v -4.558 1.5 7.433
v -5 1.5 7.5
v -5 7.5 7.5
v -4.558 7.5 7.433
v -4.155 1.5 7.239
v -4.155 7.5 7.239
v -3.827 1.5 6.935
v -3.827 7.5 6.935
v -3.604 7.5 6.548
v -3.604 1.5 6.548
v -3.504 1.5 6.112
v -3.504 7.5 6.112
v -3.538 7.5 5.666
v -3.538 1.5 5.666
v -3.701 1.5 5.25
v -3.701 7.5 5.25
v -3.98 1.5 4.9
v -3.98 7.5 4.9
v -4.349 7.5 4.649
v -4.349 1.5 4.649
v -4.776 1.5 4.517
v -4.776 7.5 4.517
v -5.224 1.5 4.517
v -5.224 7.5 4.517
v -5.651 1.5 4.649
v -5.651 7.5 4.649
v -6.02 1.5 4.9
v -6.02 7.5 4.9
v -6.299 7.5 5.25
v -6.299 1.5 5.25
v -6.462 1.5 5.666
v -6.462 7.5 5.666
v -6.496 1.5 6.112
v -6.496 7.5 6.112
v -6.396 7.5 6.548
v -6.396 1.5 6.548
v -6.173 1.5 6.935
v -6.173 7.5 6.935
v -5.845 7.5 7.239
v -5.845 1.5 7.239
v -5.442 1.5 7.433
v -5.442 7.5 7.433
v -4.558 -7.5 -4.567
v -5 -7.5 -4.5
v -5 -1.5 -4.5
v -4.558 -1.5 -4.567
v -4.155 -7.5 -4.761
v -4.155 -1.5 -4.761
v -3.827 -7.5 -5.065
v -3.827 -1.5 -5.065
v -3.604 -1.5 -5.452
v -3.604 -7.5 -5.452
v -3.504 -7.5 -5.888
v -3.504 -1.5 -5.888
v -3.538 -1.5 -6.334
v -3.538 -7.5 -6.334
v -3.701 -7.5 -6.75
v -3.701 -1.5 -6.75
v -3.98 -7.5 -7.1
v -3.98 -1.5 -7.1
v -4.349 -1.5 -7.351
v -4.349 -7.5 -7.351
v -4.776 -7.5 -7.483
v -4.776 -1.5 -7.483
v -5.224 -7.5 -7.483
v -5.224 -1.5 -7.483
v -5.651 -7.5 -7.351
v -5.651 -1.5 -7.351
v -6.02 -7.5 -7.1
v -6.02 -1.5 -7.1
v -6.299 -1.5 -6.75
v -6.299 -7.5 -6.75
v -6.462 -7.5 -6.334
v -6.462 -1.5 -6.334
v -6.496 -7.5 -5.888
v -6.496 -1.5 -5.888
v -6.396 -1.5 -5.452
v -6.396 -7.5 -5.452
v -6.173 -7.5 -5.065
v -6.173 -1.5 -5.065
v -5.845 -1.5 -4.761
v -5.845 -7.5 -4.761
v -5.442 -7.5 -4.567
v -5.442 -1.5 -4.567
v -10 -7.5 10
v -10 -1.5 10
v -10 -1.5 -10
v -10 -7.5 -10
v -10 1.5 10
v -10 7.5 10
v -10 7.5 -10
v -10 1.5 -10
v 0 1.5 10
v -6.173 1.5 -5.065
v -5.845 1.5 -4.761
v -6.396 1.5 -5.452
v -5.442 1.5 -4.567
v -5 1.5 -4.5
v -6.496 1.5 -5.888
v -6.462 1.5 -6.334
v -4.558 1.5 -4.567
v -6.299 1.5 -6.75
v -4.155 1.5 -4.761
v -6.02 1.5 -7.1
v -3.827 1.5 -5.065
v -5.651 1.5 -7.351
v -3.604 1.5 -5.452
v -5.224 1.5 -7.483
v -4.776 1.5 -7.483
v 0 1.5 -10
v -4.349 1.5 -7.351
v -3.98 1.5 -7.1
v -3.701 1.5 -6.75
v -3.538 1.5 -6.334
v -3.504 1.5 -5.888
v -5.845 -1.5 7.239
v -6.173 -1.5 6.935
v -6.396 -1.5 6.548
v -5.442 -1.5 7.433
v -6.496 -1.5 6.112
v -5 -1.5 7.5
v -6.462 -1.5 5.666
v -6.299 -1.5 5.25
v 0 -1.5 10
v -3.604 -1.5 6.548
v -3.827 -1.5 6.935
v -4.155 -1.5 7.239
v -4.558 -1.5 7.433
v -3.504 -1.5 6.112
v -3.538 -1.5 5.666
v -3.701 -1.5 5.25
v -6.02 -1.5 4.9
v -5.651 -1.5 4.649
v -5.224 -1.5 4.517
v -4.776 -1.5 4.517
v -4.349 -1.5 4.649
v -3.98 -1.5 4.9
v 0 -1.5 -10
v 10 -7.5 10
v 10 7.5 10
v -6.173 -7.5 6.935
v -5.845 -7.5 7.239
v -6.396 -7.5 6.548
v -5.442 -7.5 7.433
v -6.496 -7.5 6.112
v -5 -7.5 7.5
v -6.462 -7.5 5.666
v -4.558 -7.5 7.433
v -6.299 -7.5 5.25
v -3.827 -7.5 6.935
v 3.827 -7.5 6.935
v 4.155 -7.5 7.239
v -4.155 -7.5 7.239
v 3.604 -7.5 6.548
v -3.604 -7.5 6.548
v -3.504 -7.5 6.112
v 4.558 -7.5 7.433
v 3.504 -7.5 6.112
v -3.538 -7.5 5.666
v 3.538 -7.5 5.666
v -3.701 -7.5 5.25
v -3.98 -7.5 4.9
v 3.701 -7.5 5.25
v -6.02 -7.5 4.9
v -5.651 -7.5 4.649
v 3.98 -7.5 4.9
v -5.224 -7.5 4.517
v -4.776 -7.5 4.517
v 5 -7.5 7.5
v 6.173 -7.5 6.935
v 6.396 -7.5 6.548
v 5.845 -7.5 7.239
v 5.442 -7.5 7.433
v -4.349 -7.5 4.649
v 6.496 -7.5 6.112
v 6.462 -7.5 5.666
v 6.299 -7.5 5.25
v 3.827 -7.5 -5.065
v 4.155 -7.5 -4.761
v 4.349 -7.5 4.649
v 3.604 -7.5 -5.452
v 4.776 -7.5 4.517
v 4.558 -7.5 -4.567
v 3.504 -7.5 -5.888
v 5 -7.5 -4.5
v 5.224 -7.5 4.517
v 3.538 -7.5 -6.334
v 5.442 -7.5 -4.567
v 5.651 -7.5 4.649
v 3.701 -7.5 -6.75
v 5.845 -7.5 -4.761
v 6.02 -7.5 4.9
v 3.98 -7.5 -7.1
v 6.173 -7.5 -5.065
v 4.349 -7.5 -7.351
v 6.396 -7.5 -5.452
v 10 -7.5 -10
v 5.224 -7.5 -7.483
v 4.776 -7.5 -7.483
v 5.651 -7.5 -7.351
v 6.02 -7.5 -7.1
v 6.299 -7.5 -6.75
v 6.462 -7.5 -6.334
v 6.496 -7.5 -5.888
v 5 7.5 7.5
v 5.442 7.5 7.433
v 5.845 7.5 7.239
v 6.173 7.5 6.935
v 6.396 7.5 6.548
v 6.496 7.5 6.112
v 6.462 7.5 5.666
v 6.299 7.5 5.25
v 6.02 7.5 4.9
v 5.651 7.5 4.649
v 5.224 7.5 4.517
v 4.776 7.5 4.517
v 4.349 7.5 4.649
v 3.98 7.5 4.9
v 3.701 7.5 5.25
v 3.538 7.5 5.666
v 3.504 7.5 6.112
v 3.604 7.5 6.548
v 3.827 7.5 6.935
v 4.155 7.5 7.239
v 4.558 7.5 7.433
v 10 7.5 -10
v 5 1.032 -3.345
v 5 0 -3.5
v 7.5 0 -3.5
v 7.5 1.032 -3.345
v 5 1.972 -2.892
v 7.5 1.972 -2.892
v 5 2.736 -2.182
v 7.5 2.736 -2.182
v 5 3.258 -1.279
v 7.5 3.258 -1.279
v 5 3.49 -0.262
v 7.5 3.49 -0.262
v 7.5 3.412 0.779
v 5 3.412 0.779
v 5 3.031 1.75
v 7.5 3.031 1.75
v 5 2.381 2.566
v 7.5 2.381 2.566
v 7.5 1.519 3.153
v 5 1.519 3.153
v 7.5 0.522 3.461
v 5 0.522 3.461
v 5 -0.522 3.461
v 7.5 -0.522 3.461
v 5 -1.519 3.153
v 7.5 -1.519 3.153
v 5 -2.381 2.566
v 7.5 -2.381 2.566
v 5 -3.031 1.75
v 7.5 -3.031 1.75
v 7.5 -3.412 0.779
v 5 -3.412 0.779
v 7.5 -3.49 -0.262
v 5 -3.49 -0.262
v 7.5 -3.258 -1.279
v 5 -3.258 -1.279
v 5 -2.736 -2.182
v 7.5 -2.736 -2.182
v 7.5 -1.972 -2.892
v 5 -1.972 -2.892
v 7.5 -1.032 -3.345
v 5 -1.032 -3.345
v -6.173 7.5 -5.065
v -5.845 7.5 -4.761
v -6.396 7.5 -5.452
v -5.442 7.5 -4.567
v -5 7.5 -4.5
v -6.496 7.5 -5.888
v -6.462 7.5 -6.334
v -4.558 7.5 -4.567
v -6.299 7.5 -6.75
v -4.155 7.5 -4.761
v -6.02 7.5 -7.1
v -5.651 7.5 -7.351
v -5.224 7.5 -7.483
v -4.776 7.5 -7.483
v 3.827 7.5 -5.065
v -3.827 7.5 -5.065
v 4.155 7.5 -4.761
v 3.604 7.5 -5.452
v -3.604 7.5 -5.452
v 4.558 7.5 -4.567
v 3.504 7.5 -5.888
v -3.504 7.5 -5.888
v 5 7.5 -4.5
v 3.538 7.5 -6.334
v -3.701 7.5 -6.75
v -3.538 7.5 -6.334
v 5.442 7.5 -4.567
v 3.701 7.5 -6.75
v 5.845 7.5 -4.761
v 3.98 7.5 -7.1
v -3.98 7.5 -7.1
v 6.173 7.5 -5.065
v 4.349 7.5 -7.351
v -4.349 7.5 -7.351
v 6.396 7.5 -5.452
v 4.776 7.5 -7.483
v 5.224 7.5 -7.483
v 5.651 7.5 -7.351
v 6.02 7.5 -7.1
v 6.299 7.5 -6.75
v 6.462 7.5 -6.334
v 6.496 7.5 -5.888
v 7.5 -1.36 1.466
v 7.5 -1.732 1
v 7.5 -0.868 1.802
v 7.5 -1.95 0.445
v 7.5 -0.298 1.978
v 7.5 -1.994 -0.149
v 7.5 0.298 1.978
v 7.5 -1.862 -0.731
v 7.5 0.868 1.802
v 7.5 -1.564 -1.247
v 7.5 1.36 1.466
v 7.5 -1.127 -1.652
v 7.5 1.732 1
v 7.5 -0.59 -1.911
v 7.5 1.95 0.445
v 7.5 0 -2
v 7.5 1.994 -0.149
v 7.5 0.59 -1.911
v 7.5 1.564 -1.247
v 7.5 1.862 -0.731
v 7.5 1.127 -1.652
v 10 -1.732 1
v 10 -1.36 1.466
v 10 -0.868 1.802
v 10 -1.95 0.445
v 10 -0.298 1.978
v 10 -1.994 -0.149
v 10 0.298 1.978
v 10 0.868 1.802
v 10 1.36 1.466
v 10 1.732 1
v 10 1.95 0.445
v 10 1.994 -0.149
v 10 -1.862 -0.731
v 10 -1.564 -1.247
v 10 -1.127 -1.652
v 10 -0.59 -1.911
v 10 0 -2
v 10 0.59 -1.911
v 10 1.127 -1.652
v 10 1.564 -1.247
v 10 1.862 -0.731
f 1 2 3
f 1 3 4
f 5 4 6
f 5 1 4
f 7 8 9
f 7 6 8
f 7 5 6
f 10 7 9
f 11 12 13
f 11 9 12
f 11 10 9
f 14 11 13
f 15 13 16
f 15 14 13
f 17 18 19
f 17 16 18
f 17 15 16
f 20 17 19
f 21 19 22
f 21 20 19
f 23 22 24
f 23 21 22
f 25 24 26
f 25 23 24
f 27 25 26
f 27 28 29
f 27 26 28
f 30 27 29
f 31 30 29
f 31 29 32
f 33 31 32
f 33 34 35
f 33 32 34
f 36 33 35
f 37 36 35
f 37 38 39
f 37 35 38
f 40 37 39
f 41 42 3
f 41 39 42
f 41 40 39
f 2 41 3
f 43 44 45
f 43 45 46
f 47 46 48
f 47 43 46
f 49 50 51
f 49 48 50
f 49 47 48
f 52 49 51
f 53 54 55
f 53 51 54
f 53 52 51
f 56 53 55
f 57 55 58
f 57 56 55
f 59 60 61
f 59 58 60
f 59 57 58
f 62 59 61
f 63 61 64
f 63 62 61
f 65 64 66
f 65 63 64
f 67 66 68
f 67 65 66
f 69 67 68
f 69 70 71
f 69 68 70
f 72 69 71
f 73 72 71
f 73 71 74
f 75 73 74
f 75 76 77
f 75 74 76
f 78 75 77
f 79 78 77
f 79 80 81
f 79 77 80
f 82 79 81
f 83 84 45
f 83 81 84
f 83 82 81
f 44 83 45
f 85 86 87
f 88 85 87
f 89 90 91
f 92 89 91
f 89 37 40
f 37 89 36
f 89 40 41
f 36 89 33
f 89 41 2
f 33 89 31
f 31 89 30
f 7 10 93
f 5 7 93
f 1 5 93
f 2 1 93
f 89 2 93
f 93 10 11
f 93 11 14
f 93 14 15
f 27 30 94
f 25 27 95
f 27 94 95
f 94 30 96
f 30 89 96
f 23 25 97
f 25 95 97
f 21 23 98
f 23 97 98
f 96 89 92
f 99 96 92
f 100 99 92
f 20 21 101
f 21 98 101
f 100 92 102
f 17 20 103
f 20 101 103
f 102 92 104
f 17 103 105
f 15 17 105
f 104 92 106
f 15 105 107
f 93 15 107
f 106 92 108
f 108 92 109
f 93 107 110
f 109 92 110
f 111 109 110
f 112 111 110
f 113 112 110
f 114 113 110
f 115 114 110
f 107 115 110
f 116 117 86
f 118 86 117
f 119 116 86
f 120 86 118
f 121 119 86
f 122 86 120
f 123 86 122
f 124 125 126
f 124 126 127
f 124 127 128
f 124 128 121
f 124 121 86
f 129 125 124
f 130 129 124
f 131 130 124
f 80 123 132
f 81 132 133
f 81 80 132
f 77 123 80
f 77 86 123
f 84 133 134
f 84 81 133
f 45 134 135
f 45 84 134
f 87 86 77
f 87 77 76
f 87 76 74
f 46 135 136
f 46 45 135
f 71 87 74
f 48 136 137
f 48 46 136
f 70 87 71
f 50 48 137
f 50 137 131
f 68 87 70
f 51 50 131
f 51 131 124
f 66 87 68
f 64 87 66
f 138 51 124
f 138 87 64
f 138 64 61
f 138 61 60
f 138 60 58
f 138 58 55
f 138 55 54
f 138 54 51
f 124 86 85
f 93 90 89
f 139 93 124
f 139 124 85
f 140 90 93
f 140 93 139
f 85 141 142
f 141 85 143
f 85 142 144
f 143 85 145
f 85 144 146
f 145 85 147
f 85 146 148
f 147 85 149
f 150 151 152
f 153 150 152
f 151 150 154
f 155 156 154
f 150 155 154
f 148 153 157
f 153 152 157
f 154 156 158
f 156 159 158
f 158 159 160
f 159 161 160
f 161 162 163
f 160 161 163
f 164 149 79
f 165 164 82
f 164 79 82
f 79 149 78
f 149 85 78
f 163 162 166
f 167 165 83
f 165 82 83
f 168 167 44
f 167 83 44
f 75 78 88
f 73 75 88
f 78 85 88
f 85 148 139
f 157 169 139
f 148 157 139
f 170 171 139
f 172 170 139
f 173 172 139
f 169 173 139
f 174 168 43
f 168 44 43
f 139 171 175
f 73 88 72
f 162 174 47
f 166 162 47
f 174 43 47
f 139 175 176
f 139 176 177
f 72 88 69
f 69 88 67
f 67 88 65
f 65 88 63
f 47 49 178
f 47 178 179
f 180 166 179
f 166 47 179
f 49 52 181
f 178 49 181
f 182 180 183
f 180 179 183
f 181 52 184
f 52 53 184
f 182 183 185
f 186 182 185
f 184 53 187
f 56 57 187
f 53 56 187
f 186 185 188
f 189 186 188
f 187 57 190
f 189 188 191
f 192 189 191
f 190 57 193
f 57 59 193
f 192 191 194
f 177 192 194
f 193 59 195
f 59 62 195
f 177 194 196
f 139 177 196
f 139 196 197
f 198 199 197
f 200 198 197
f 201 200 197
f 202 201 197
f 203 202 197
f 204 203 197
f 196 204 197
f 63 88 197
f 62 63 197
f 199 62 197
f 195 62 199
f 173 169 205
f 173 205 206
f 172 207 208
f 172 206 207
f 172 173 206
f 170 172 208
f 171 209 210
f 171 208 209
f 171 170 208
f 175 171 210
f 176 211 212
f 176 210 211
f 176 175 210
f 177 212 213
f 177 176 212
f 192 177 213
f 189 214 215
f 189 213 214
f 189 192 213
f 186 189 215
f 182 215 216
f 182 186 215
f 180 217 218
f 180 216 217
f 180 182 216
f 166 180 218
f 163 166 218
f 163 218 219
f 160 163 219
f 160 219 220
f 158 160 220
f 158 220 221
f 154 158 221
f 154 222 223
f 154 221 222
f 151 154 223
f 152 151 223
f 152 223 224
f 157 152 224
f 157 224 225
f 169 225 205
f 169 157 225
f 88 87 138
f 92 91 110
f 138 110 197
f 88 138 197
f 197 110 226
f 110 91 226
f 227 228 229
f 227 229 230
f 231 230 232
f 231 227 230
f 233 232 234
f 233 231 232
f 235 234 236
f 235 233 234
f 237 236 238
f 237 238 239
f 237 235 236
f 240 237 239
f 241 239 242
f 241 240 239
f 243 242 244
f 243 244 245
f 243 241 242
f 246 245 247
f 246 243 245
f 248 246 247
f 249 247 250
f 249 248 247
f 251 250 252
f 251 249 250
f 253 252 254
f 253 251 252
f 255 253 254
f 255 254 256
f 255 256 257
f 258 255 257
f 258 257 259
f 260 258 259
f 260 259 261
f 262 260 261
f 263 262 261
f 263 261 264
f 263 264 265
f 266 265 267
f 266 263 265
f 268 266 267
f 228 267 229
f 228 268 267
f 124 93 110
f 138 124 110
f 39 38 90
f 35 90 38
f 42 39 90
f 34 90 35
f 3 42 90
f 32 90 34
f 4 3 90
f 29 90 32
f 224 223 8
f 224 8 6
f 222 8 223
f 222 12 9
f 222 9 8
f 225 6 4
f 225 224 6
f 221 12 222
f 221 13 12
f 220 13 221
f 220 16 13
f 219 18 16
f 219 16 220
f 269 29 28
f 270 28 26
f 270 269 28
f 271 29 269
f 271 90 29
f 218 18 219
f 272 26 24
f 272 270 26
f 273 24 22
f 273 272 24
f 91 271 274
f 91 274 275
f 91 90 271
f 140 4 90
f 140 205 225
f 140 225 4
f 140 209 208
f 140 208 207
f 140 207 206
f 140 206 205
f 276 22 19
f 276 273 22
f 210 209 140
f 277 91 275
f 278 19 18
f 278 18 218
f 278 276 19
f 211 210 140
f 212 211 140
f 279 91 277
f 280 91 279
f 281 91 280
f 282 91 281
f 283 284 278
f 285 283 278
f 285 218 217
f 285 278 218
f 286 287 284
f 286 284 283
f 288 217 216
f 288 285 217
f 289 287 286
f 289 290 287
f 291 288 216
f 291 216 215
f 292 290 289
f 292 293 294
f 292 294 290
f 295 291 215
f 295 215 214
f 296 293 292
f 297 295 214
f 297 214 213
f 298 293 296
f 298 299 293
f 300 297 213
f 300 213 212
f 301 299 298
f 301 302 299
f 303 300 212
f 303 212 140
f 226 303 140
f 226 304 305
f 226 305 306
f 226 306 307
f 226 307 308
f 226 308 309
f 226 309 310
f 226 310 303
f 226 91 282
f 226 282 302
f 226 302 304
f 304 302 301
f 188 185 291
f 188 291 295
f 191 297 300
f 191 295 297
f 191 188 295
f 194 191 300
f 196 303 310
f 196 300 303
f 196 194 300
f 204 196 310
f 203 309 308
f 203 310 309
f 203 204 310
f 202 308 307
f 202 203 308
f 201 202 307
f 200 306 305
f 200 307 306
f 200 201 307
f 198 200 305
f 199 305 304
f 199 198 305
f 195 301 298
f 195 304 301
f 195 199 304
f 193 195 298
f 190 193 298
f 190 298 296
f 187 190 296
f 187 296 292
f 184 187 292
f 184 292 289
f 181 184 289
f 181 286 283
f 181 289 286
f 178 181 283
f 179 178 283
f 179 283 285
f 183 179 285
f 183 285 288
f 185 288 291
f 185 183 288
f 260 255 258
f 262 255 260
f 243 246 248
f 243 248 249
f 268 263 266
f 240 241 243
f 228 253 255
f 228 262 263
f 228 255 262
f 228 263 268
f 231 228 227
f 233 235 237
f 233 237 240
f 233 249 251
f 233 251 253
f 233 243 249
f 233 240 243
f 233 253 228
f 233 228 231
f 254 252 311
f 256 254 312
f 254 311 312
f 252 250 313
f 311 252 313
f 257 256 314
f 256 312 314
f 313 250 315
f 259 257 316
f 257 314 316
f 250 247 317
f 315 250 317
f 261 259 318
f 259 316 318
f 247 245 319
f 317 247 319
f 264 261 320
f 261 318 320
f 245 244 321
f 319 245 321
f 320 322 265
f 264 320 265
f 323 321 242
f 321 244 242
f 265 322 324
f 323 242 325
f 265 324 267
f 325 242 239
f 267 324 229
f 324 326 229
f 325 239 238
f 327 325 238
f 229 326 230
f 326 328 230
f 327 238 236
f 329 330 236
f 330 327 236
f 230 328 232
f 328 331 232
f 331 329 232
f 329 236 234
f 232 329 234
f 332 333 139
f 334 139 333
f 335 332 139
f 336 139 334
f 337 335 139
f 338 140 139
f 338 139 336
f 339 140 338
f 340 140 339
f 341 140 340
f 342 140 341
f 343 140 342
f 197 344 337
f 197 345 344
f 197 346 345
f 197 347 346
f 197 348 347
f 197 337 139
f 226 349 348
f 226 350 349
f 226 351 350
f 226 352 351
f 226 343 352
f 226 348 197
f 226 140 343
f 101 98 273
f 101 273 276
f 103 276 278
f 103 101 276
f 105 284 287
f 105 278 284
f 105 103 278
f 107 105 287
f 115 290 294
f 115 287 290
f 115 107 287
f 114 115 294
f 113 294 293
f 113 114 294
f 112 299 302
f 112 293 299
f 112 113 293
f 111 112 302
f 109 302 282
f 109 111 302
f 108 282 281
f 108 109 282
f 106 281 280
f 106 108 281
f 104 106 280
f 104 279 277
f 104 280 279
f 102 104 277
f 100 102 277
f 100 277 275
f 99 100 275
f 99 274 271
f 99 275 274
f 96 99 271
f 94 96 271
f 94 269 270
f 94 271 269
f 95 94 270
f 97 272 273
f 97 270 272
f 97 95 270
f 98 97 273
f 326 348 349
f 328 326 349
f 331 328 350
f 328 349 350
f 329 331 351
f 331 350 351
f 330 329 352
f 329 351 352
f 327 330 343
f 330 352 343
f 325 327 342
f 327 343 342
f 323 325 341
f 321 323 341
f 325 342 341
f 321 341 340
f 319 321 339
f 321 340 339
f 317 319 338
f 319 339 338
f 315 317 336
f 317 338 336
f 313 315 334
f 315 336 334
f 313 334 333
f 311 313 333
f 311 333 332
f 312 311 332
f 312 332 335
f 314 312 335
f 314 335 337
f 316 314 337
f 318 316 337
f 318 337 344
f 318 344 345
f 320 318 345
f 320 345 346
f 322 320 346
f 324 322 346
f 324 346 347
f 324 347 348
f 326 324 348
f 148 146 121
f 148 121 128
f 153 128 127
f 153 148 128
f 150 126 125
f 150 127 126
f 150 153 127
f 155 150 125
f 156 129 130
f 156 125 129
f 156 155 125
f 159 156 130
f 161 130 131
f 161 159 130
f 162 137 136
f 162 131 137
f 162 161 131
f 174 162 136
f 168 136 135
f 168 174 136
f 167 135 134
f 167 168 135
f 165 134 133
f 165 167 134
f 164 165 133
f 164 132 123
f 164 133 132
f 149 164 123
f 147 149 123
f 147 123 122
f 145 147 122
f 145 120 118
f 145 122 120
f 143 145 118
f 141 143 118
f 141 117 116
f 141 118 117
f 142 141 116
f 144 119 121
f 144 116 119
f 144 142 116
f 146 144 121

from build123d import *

# Parameters (mm, degrees)
SKETCH1_W            = 20
SKETCH1_H            = 20
BOSS_EXTRUDE1_DEPTH  = 7.5
SKETCH1_3_W          = 20
SKETCH1_3_H          = 20
CUT_EXTRUDE2_DEPTH   = 1.5
SKETCH3_W            = 10
SKETCH3_H            = 20
BOSS_EXTRUDE2_DEPTH  = 1.5
MOUNTHOLE_DEPTH      = 17.007810594
MOUNTHOLE_DEPTH_BACK = 17.007810594
SKETCH5_R            = 1.5
SKETCH6_R            = 3.5
BEARINGHOLE_DEPTH    = 2.5
SKETCH4_R            = 2
SHAFT_DEPTH          = 5


with BuildPart() as part:
    # Sketch1 → Boss-Extrude1 (new, symmetric)
    with BuildSketch(Plane(origin=(0, 0, 0), x_dir=(1, 0, 0), z_dir=(0, 1, 0))):
        Rectangle(SKETCH1_W, SKETCH1_H)
    extrude(amount=BOSS_EXTRUDE1_DEPTH, both=True)

    # Sketch1<3> → Cut-Extrude2 (cut, symmetric)
    with BuildSketch(Plane(origin=(0, 0, 0), x_dir=(1, 0, 0), z_dir=(0, 1, 0))):
        Rectangle(SKETCH1_3_W, SKETCH1_3_H)
    extrude(amount=CUT_EXTRUDE2_DEPTH, both=True, mode=Mode.SUBTRACT)


with BuildPart() as cut_extrude2_piece_1:
    # of the separate pieces the step leaves, piece 1, a body of its own (cut_extrude2_pieces)
    add(part.part.solids().sort_by_distance((-10, -7.5, -10))[0])



with BuildPart() as cut_extrude2_piece_2:
    # of the separate pieces the step leaves, piece 2, a body of its own (cut_extrude2_pieces)
    add(part.part.solids().sort_by_distance((-10, 1.5, -10))[0])


with BuildPart() as cut_extrude2_piece_1_1:
    add(cut_extrude2_piece_1.part)

    add(cut_extrude2_piece_2.part)  # Boss-Extrude2 merges Cut-Extrude2 piece 2
    # Sketch3 → Boss-Extrude2 (add, symmetric)
    with BuildSketch(Plane(origin=(0, 0, 0), x_dir=(1, 0, 0), z_dir=(0, 1, 0))):
        with Locations((5, 0)):
            Rectangle(SKETCH3_W, SKETCH3_H)
    extrude(amount=BOSS_EXTRUDE2_DEPTH, both=True)

    # Sketch5 → mounthole (cut, two sides: drawn at the far end of the back side and taken through both)
    with BuildSketch(Plane(origin=(0, 0, 0), x_dir=(1, 0, 0), z_dir=(0, 1, 0)).offset(-MOUNTHOLE_DEPTH_BACK)):
        with Locations((-5, 6)):
            Circle(SKETCH5_R)
        with Locations((5, 6)):
            Circle(SKETCH5_R)
        with Locations((5, -6)):
            Circle(SKETCH5_R)
        with Locations((-5, -6)):
            Circle(SKETCH5_R)
    extrude(amount=MOUNTHOLE_DEPTH + MOUNTHOLE_DEPTH_BACK, mode=Mode.SUBTRACT)

    # Sketch6 → bearinghole (cut)
    with BuildSketch(Plane(origin=(5, 0, 0), x_dir=(0, 0, -1), z_dir=(1, 0, 0))):
        Circle(SKETCH6_R)
    extrude(amount=BEARINGHOLE_DEPTH, mode=Mode.SUBTRACT)

    # Sketch4 → shaft (cut)
    with BuildSketch(Plane(origin=(10, 0, 0), x_dir=(0, 0, -1), z_dir=(1, 0, 0))):
        Circle(SKETCH4_R)
    extrude(amount=-SHAFT_DEPTH, mode=Mode.SUBTRACT)


solid = cut_extrude2_piece_1_1.part
